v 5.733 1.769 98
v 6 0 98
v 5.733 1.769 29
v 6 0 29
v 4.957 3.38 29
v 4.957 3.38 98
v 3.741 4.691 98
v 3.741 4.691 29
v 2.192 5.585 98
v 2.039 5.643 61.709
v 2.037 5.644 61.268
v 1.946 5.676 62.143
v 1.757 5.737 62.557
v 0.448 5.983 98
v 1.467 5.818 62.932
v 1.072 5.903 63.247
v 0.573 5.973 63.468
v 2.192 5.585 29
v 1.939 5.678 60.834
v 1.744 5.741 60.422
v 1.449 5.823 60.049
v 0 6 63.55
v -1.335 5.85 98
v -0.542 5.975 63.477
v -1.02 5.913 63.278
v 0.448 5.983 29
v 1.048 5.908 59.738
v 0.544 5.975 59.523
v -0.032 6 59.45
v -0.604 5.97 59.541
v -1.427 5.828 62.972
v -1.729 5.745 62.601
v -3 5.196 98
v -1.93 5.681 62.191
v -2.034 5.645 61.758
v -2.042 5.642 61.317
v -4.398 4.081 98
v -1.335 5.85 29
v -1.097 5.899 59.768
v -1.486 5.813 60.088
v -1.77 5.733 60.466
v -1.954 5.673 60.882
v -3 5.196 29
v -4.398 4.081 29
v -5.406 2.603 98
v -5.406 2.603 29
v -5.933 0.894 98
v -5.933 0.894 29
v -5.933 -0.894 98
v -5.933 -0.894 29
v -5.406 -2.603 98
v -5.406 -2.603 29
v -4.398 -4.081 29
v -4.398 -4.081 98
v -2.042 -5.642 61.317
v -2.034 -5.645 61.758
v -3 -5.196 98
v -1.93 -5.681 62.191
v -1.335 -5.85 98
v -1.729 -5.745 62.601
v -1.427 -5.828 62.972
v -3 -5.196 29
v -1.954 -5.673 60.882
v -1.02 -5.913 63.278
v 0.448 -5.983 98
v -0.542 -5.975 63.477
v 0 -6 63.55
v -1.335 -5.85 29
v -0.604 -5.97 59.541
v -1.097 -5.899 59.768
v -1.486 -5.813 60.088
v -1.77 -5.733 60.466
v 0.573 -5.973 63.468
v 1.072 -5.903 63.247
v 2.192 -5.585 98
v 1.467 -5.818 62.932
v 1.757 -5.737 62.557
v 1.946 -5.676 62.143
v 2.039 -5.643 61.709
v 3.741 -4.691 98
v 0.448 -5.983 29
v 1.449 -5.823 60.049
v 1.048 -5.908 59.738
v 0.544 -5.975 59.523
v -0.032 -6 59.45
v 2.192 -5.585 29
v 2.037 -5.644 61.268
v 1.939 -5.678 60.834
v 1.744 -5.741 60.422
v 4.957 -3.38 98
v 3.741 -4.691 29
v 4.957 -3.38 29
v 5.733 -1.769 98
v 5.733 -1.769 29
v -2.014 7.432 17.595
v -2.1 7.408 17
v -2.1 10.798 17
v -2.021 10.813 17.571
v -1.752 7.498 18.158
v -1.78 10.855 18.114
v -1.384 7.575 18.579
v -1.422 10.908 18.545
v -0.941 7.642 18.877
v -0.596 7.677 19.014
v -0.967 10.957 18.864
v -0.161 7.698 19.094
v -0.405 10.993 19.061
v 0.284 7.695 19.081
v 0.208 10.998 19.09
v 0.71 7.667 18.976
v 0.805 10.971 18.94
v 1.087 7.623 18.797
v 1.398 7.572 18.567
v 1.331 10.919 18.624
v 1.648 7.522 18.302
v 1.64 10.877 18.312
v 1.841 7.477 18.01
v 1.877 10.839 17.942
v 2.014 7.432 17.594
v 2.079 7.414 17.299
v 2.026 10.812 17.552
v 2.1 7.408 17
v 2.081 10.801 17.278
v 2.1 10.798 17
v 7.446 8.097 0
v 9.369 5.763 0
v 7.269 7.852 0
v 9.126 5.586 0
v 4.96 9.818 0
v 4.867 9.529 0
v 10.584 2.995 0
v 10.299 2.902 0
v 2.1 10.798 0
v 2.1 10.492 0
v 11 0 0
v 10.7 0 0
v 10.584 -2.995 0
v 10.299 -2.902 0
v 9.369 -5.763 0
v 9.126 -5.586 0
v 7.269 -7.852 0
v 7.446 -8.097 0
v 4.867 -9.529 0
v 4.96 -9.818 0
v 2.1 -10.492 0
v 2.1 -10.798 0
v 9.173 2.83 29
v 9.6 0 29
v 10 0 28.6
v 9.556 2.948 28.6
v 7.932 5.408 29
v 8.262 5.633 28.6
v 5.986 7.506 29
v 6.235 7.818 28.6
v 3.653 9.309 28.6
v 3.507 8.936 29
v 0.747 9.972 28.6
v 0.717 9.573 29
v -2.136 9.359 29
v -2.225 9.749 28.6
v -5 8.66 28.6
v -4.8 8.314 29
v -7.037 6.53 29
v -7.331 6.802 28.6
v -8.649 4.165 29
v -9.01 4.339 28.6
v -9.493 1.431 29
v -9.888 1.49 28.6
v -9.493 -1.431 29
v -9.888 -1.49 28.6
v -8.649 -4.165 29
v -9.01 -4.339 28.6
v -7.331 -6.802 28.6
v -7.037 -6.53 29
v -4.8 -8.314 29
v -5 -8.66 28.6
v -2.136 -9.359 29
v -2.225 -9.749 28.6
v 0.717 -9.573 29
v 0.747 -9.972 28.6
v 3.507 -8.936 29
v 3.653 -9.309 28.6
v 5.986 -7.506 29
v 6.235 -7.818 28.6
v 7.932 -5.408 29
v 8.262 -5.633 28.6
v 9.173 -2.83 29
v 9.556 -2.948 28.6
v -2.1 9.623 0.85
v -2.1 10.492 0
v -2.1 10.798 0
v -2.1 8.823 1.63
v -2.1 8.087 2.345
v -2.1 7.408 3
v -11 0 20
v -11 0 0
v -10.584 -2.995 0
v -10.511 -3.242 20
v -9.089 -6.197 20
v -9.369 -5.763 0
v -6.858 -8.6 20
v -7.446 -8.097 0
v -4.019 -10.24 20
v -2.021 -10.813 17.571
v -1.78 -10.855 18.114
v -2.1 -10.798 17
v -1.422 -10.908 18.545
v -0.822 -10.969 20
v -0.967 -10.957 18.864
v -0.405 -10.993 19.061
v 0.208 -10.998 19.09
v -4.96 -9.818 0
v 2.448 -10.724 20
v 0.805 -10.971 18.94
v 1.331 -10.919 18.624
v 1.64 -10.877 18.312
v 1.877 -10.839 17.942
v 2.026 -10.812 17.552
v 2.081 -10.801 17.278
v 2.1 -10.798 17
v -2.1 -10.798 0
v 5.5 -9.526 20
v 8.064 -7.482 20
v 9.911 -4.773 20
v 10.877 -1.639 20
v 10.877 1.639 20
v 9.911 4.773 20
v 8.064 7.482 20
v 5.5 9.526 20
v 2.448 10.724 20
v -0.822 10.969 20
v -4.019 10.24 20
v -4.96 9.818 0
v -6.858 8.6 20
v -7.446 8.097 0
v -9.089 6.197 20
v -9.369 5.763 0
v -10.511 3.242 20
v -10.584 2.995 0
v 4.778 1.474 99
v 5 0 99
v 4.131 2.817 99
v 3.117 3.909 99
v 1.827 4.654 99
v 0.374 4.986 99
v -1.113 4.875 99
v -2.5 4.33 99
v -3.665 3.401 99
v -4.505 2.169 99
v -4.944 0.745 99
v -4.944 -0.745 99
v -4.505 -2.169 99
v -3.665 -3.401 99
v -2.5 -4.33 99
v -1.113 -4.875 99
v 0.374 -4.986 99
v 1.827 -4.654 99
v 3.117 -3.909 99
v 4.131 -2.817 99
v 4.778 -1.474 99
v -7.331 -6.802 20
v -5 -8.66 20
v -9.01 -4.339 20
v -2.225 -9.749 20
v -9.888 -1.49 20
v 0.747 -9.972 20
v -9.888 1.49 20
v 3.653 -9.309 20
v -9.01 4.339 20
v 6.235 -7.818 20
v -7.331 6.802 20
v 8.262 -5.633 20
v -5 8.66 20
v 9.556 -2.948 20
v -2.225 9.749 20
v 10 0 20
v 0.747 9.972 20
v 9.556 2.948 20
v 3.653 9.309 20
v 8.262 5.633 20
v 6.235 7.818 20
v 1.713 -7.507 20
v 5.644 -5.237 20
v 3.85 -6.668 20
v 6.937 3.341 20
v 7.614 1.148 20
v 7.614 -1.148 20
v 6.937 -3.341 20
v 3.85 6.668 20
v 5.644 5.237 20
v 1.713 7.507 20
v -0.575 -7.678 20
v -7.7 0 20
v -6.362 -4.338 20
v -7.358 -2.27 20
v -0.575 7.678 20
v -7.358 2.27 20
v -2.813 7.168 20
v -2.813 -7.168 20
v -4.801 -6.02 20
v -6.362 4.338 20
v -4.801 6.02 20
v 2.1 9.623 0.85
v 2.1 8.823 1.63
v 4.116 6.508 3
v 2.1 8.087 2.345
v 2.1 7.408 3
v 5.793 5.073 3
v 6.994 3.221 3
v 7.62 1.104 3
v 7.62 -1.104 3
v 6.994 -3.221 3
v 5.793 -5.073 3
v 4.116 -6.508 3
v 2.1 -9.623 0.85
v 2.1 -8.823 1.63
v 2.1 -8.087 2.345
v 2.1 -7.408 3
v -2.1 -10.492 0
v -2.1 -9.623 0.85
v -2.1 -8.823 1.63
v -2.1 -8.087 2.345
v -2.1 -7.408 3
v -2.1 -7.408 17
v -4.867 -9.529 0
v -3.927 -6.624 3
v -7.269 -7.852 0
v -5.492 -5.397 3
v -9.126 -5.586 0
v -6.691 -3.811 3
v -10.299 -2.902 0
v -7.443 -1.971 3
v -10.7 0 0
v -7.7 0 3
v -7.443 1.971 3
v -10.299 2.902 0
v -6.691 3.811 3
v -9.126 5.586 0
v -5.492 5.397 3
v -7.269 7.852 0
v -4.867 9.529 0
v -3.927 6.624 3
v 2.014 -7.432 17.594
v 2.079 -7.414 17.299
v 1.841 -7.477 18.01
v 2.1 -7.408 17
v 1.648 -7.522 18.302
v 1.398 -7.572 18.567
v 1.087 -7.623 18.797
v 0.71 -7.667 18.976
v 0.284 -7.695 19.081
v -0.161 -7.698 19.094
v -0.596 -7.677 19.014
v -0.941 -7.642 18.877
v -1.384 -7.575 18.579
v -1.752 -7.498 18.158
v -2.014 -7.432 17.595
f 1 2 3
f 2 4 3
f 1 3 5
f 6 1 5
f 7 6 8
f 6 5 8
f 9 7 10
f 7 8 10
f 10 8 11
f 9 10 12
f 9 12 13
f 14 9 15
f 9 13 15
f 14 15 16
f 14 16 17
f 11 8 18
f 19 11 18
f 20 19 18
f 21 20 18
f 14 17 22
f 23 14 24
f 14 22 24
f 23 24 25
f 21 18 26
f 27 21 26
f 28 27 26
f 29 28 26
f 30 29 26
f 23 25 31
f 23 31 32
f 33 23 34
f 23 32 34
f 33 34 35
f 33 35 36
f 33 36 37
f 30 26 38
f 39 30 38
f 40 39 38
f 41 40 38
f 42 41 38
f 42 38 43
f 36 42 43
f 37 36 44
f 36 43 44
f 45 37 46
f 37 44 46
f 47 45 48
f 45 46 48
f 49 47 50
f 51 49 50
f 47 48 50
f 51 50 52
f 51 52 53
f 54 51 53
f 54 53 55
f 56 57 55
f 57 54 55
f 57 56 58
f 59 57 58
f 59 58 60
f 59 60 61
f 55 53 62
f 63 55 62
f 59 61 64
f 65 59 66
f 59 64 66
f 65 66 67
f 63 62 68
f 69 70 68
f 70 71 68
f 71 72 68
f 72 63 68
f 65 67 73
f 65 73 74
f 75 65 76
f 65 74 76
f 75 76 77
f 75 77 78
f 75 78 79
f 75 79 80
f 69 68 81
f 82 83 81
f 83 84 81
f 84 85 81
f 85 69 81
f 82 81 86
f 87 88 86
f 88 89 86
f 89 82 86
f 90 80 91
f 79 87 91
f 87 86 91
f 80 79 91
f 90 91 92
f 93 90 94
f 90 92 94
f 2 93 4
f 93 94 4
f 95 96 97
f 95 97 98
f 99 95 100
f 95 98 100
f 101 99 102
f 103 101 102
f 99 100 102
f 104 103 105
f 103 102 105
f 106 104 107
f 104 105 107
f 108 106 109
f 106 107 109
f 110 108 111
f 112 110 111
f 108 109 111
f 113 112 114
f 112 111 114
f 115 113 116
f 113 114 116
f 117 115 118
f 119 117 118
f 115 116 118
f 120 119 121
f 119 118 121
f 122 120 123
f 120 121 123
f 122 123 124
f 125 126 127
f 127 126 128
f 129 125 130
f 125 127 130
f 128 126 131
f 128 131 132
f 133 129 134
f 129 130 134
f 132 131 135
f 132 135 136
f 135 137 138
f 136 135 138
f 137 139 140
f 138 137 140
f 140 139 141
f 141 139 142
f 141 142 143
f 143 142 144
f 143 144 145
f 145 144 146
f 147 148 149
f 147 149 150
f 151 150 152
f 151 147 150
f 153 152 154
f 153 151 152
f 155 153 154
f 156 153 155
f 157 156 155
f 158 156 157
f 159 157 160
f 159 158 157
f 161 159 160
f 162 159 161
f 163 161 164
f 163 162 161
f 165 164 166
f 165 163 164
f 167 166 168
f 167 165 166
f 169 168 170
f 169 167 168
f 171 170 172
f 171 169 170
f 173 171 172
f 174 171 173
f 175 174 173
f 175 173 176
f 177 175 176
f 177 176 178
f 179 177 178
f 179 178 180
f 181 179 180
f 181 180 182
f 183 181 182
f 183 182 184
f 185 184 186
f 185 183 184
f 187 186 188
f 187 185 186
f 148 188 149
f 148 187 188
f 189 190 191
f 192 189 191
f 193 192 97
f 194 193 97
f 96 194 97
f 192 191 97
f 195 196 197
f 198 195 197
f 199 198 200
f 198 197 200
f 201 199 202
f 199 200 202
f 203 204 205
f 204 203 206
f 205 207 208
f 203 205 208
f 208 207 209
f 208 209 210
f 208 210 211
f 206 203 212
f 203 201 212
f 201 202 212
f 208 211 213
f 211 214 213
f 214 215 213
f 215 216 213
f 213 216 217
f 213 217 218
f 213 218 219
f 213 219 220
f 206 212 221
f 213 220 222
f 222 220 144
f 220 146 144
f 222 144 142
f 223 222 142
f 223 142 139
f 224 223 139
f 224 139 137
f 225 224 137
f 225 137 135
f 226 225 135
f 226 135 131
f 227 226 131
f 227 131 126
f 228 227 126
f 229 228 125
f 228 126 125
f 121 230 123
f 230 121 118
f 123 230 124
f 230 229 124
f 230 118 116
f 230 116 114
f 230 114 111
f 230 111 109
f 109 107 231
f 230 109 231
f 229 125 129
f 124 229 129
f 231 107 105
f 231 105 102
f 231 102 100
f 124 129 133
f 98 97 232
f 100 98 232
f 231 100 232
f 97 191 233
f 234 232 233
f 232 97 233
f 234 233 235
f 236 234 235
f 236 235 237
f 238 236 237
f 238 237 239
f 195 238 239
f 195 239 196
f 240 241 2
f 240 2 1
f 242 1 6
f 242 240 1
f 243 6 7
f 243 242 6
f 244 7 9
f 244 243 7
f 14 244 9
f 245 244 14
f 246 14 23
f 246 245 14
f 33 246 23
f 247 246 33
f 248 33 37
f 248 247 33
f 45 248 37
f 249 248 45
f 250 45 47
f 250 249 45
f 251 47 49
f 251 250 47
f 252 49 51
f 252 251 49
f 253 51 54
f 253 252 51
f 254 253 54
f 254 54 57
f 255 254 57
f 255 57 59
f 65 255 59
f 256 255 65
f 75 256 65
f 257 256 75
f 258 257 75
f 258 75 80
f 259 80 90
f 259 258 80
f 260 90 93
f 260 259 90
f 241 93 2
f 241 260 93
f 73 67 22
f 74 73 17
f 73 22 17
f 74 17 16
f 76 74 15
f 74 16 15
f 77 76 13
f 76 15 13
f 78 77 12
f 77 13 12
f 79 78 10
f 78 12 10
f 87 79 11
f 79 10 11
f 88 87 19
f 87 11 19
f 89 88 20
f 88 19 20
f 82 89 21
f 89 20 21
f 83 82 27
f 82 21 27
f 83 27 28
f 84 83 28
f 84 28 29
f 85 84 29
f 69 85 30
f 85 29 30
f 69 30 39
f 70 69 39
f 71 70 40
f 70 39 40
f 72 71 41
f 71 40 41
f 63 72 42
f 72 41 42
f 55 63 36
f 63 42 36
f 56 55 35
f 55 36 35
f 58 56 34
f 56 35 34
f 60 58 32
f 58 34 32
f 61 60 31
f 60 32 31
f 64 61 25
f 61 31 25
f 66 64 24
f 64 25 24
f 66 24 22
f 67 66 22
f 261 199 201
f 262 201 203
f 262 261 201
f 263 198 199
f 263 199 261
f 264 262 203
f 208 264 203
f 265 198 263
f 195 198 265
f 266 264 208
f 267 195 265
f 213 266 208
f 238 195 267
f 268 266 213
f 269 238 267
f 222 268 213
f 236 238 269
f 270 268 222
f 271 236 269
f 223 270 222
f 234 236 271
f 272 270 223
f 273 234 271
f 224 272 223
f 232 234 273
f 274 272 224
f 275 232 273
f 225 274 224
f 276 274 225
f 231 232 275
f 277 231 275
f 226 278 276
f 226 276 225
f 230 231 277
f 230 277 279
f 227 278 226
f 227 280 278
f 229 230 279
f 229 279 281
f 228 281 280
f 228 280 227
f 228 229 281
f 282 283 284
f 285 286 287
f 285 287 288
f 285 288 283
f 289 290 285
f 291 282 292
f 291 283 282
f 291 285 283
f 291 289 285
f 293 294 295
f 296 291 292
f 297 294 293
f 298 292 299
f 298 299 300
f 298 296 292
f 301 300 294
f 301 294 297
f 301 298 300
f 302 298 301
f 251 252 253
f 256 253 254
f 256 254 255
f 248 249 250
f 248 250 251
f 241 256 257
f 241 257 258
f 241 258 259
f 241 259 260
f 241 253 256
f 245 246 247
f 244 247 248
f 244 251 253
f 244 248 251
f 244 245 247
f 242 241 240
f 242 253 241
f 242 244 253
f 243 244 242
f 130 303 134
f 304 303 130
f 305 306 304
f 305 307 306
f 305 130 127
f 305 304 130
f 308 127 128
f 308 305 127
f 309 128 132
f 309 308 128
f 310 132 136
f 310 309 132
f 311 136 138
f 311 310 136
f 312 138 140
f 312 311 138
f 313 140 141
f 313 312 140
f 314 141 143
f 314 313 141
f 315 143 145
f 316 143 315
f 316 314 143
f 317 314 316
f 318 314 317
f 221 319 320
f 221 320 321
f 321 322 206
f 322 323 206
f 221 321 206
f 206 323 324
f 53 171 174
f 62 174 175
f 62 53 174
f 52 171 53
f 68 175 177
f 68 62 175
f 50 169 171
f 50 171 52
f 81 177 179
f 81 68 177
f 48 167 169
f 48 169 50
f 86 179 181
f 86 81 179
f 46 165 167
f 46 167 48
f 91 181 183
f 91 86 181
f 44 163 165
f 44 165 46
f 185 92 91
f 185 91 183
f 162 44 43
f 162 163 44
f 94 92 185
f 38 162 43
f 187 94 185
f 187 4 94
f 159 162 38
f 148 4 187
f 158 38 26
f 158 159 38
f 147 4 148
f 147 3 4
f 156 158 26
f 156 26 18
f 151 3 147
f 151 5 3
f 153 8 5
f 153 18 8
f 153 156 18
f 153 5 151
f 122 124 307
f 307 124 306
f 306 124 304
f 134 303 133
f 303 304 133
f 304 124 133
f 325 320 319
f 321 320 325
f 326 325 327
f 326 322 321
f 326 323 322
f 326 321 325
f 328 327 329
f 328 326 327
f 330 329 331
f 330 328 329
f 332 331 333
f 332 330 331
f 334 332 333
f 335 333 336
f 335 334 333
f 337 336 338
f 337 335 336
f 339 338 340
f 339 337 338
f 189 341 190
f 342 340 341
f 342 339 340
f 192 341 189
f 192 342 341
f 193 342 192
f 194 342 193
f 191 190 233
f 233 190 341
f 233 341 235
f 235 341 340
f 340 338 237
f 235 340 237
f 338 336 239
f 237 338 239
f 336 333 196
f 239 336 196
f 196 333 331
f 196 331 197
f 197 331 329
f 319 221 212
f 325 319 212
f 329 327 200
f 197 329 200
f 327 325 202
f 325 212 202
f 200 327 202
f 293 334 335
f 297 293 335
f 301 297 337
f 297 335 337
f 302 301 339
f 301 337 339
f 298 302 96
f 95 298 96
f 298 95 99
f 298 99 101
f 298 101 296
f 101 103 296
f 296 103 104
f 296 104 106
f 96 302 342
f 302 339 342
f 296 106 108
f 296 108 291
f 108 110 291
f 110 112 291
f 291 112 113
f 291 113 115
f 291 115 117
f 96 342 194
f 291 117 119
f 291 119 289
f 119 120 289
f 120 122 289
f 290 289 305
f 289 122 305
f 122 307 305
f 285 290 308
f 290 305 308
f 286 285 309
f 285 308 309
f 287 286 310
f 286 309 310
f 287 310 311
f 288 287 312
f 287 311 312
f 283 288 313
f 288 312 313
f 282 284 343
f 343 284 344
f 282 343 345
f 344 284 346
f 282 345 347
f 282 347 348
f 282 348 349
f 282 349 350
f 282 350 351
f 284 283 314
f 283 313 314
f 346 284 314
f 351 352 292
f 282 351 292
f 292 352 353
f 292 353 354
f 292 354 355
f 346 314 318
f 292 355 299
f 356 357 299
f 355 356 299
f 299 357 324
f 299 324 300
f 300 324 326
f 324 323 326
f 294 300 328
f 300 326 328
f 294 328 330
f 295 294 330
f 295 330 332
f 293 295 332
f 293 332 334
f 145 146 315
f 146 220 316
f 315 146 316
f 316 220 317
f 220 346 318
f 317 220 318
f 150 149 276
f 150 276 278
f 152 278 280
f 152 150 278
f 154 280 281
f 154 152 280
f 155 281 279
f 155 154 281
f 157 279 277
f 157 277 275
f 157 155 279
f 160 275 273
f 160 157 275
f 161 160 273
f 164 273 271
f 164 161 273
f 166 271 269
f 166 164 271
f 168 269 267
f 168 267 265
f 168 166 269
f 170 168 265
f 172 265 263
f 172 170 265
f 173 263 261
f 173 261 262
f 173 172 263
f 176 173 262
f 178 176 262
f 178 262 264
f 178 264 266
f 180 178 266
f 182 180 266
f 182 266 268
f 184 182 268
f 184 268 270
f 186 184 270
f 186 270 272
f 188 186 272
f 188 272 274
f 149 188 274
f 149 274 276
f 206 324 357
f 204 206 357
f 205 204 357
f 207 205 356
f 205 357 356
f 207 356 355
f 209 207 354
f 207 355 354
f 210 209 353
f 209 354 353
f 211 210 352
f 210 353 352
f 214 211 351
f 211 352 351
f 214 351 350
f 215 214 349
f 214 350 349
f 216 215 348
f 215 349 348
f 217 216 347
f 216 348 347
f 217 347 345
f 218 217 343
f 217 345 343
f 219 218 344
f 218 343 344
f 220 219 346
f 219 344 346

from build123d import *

# Parameters (mm, degrees)
SKETCH_1_R           = 11
EXTRUDE_1_DEPTH      = 29
SKETCH_2_OUTSIDE_W   = 32.506
SKETCH_2_OUTSIDE_H   = 32.506
SKETCH_2_OUTSIDE_R   = 10
CUT_EXTRUDE_1_DEPTH  = 9
SKETCH_3_R           = 7.7
CUT_EXTRUDE_2_DEPTH  = 20
SKETCH_4_R           = 2.1
CUT_EXTRUDE_3_DEPTH  = 25
CHAMFER_1_SIZE       = 3
EXTRUDE_START        = 10
SKETCH_5_R           = 10
EXTRUDE_2_DEPTH      = 10
CUT_EXTRUDE_5_DEPTH  = 19
CUT_EXTRUDE_6_DEPTH  = 19
CHAMFER_2_SIZE       = 0.4
SKETCH_12_R          = 10
CUT_EXTRUDE_9_DEPTH  = 10
SKETCH_13_R          = 4.1
CUT_EXTRUDE_10_DEPTH = 9
CHAMFER_3_SIZE       = 0.4
SKETCH_15_R          = 4.1
EXTRUDE_3_DEPTH      = 9
SKETCH_16_R          = 6
EXTRUDE_4_DEPTH      = 70
CHAMFER_4_SIZE       = 1
SKETCH_17_R          = 2.05
CUT_EXTRUDE_12_DEPTH = 35


with BuildPart() as part:
    # 草图1 → 凸台-拉伸1 (new body)
    with BuildSketch(Plane.XY):
        with Locations(Location((0, 0, 0), (0, 0, 180))):
            Circle(SKETCH_1_R)
    extrude(amount=EXTRUDE_1_DEPTH)

    # 草图2 outside → 切除-拉伸1 (cut)
    with BuildSketch(Plane.XY.offset(29)):
        Rectangle(SKETCH_2_OUTSIDE_W, SKETCH_2_OUTSIDE_H)
        Circle(SKETCH_2_OUTSIDE_R, mode=Mode.SUBTRACT)
    extrude(amount=-CUT_EXTRUDE_1_DEPTH, mode=Mode.SUBTRACT)

    # 草图3 → 切除-拉伸2 (cut)
    with BuildSketch(Plane(origin=(0, 0, 0), x_dir=(-1, 0, 0), z_dir=(0, 0, -1))):
        Circle(SKETCH_3_R)
    extrude(amount=-CUT_EXTRUDE_2_DEPTH, mode=Mode.SUBTRACT)

    # 草图4 → 切除-拉伸3 (cut, symmetric)
    with BuildSketch(Plane(origin=(0, 0, 0), x_dir=(1, 0, 0), z_dir=(0, 1, 0))):
        with BuildLine():
            Line((-2.1, 0), (-2.1, -17))
            ThreePointArc((-2.1, -17), (0, -14.9), (2.1, -17))
            Line((2.1, -17), (2.1, 0))
            Line((2.1, 0), (-2.1, 0))
        make_face()
        with Locations((0, -17)):
            Circle(SKETCH_4_R)
    extrude(amount=CUT_EXTRUDE_3_DEPTH, both=True, mode=Mode.SUBTRACT)

    # 倒角1
    chamfer_1_edges = [part.edges().sort_by_distance(p)[0] for p in [
        (7.7, 0, 0),
        (-6.142475071, -4.643274706, 0),
    ]]
    chamfer(chamfer_1_edges, length=CHAMFER_1_SIZE)

    # 草图5 → 凸台-拉伸2 (add)
    with BuildSketch(Plane.XY.offset(29).offset(EXTRUDE_START)):
        Circle(SKETCH_5_R)
    extrude(amount=-EXTRUDE_2_DEPTH)

    # 草图6 → 切除-拉伸5 (cut)
    with BuildSketch(Plane.XY.offset(39)):
        with BuildLine():
            Line((3.122498999, 2.5), (-3.122498999, 2.5))
            ThreePointArc((-3.122498999, 2.5), (-1.324764885, -3.774254628), (4, 0))
            ThreePointArc((4, 0), (3.774254628, 1.324764885), (3.122498999, 2.5))
        make_face()
    extrude(amount=-CUT_EXTRUDE_5_DEPTH, mode=Mode.SUBTRACT)

    # 草图7 → 切除-拉伸6 (cut)
    with BuildSketch(Plane.XY.offset(39)):
        with BuildLine():
            Line((3.170173497, 2.6), (-3.170173497, 2.6))
            ThreePointArc((-3.170173497, 2.6), (0, -4.1), (3.170173497, 2.6))
        make_face()
    extrude(amount=-CUT_EXTRUDE_6_DEPTH, mode=Mode.SUBTRACT)

    # 倒角2
    chamfer_2_edges = [part.edges().sort_by_distance(p)[0] for p in [
        (0, -4.1, 39),
        (0, 2.6, 39),
    ]]
    chamfer(chamfer_2_edges, length=CHAMFER_2_SIZE)

    # 草图12 → 切除-拉伸9 (cut)
    with BuildSketch(Plane.XY.offset(39)):
        Circle(SKETCH_12_R)
    extrude(amount=-CUT_EXTRUDE_9_DEPTH, mode=Mode.SUBTRACT)

    # 草图13 → 切除-拉伸10 (cut)
    with BuildSketch(Plane.XY.offset(29)):
        Circle(SKETCH_13_R)
    extrude(amount=-CUT_EXTRUDE_10_DEPTH, mode=Mode.SUBTRACT)

    # 倒角3
    chamfer_3_edges = [part.edges().sort_by_distance(p)[0] for p in [
        (-10, 0, 29),
    ]]
    chamfer(chamfer_3_edges, length=CHAMFER_3_SIZE)

    # 草图15 → 凸台-拉伸3 (add)
    with BuildSketch(Plane.XY.offset(29)):
        Circle(SKETCH_15_R)
    extrude(amount=-EXTRUDE_3_DEPTH)

    # 草图16 → 凸台-拉伸4 (add)
    with BuildSketch(Plane.XY.offset(29)):
        Circle(SKETCH_16_R)
    extrude(amount=EXTRUDE_4_DEPTH)

    # 倒角4
    chamfer_4_edges = [part.edges().sort_by_distance(p)[0] for p in [
        (-6, 0, 99),
    ]]
    chamfer(chamfer_4_edges, length=CHAMFER_4_SIZE)

    # 草图17 → 切除-拉伸12 (cut, symmetric)
    with BuildSketch(Plane(origin=(0, 0, 0), x_dir=(1, 0, 0), z_dir=(0, 1, 0))):
        with Locations(Location((0, -61.5, 0), (0, 0, 270))):
            Circle(SKETCH_17_R)
    extrude(amount=CUT_EXTRUDE_12_DEPTH, both=True, mode=Mode.SUBTRACT)


solid = part.part
